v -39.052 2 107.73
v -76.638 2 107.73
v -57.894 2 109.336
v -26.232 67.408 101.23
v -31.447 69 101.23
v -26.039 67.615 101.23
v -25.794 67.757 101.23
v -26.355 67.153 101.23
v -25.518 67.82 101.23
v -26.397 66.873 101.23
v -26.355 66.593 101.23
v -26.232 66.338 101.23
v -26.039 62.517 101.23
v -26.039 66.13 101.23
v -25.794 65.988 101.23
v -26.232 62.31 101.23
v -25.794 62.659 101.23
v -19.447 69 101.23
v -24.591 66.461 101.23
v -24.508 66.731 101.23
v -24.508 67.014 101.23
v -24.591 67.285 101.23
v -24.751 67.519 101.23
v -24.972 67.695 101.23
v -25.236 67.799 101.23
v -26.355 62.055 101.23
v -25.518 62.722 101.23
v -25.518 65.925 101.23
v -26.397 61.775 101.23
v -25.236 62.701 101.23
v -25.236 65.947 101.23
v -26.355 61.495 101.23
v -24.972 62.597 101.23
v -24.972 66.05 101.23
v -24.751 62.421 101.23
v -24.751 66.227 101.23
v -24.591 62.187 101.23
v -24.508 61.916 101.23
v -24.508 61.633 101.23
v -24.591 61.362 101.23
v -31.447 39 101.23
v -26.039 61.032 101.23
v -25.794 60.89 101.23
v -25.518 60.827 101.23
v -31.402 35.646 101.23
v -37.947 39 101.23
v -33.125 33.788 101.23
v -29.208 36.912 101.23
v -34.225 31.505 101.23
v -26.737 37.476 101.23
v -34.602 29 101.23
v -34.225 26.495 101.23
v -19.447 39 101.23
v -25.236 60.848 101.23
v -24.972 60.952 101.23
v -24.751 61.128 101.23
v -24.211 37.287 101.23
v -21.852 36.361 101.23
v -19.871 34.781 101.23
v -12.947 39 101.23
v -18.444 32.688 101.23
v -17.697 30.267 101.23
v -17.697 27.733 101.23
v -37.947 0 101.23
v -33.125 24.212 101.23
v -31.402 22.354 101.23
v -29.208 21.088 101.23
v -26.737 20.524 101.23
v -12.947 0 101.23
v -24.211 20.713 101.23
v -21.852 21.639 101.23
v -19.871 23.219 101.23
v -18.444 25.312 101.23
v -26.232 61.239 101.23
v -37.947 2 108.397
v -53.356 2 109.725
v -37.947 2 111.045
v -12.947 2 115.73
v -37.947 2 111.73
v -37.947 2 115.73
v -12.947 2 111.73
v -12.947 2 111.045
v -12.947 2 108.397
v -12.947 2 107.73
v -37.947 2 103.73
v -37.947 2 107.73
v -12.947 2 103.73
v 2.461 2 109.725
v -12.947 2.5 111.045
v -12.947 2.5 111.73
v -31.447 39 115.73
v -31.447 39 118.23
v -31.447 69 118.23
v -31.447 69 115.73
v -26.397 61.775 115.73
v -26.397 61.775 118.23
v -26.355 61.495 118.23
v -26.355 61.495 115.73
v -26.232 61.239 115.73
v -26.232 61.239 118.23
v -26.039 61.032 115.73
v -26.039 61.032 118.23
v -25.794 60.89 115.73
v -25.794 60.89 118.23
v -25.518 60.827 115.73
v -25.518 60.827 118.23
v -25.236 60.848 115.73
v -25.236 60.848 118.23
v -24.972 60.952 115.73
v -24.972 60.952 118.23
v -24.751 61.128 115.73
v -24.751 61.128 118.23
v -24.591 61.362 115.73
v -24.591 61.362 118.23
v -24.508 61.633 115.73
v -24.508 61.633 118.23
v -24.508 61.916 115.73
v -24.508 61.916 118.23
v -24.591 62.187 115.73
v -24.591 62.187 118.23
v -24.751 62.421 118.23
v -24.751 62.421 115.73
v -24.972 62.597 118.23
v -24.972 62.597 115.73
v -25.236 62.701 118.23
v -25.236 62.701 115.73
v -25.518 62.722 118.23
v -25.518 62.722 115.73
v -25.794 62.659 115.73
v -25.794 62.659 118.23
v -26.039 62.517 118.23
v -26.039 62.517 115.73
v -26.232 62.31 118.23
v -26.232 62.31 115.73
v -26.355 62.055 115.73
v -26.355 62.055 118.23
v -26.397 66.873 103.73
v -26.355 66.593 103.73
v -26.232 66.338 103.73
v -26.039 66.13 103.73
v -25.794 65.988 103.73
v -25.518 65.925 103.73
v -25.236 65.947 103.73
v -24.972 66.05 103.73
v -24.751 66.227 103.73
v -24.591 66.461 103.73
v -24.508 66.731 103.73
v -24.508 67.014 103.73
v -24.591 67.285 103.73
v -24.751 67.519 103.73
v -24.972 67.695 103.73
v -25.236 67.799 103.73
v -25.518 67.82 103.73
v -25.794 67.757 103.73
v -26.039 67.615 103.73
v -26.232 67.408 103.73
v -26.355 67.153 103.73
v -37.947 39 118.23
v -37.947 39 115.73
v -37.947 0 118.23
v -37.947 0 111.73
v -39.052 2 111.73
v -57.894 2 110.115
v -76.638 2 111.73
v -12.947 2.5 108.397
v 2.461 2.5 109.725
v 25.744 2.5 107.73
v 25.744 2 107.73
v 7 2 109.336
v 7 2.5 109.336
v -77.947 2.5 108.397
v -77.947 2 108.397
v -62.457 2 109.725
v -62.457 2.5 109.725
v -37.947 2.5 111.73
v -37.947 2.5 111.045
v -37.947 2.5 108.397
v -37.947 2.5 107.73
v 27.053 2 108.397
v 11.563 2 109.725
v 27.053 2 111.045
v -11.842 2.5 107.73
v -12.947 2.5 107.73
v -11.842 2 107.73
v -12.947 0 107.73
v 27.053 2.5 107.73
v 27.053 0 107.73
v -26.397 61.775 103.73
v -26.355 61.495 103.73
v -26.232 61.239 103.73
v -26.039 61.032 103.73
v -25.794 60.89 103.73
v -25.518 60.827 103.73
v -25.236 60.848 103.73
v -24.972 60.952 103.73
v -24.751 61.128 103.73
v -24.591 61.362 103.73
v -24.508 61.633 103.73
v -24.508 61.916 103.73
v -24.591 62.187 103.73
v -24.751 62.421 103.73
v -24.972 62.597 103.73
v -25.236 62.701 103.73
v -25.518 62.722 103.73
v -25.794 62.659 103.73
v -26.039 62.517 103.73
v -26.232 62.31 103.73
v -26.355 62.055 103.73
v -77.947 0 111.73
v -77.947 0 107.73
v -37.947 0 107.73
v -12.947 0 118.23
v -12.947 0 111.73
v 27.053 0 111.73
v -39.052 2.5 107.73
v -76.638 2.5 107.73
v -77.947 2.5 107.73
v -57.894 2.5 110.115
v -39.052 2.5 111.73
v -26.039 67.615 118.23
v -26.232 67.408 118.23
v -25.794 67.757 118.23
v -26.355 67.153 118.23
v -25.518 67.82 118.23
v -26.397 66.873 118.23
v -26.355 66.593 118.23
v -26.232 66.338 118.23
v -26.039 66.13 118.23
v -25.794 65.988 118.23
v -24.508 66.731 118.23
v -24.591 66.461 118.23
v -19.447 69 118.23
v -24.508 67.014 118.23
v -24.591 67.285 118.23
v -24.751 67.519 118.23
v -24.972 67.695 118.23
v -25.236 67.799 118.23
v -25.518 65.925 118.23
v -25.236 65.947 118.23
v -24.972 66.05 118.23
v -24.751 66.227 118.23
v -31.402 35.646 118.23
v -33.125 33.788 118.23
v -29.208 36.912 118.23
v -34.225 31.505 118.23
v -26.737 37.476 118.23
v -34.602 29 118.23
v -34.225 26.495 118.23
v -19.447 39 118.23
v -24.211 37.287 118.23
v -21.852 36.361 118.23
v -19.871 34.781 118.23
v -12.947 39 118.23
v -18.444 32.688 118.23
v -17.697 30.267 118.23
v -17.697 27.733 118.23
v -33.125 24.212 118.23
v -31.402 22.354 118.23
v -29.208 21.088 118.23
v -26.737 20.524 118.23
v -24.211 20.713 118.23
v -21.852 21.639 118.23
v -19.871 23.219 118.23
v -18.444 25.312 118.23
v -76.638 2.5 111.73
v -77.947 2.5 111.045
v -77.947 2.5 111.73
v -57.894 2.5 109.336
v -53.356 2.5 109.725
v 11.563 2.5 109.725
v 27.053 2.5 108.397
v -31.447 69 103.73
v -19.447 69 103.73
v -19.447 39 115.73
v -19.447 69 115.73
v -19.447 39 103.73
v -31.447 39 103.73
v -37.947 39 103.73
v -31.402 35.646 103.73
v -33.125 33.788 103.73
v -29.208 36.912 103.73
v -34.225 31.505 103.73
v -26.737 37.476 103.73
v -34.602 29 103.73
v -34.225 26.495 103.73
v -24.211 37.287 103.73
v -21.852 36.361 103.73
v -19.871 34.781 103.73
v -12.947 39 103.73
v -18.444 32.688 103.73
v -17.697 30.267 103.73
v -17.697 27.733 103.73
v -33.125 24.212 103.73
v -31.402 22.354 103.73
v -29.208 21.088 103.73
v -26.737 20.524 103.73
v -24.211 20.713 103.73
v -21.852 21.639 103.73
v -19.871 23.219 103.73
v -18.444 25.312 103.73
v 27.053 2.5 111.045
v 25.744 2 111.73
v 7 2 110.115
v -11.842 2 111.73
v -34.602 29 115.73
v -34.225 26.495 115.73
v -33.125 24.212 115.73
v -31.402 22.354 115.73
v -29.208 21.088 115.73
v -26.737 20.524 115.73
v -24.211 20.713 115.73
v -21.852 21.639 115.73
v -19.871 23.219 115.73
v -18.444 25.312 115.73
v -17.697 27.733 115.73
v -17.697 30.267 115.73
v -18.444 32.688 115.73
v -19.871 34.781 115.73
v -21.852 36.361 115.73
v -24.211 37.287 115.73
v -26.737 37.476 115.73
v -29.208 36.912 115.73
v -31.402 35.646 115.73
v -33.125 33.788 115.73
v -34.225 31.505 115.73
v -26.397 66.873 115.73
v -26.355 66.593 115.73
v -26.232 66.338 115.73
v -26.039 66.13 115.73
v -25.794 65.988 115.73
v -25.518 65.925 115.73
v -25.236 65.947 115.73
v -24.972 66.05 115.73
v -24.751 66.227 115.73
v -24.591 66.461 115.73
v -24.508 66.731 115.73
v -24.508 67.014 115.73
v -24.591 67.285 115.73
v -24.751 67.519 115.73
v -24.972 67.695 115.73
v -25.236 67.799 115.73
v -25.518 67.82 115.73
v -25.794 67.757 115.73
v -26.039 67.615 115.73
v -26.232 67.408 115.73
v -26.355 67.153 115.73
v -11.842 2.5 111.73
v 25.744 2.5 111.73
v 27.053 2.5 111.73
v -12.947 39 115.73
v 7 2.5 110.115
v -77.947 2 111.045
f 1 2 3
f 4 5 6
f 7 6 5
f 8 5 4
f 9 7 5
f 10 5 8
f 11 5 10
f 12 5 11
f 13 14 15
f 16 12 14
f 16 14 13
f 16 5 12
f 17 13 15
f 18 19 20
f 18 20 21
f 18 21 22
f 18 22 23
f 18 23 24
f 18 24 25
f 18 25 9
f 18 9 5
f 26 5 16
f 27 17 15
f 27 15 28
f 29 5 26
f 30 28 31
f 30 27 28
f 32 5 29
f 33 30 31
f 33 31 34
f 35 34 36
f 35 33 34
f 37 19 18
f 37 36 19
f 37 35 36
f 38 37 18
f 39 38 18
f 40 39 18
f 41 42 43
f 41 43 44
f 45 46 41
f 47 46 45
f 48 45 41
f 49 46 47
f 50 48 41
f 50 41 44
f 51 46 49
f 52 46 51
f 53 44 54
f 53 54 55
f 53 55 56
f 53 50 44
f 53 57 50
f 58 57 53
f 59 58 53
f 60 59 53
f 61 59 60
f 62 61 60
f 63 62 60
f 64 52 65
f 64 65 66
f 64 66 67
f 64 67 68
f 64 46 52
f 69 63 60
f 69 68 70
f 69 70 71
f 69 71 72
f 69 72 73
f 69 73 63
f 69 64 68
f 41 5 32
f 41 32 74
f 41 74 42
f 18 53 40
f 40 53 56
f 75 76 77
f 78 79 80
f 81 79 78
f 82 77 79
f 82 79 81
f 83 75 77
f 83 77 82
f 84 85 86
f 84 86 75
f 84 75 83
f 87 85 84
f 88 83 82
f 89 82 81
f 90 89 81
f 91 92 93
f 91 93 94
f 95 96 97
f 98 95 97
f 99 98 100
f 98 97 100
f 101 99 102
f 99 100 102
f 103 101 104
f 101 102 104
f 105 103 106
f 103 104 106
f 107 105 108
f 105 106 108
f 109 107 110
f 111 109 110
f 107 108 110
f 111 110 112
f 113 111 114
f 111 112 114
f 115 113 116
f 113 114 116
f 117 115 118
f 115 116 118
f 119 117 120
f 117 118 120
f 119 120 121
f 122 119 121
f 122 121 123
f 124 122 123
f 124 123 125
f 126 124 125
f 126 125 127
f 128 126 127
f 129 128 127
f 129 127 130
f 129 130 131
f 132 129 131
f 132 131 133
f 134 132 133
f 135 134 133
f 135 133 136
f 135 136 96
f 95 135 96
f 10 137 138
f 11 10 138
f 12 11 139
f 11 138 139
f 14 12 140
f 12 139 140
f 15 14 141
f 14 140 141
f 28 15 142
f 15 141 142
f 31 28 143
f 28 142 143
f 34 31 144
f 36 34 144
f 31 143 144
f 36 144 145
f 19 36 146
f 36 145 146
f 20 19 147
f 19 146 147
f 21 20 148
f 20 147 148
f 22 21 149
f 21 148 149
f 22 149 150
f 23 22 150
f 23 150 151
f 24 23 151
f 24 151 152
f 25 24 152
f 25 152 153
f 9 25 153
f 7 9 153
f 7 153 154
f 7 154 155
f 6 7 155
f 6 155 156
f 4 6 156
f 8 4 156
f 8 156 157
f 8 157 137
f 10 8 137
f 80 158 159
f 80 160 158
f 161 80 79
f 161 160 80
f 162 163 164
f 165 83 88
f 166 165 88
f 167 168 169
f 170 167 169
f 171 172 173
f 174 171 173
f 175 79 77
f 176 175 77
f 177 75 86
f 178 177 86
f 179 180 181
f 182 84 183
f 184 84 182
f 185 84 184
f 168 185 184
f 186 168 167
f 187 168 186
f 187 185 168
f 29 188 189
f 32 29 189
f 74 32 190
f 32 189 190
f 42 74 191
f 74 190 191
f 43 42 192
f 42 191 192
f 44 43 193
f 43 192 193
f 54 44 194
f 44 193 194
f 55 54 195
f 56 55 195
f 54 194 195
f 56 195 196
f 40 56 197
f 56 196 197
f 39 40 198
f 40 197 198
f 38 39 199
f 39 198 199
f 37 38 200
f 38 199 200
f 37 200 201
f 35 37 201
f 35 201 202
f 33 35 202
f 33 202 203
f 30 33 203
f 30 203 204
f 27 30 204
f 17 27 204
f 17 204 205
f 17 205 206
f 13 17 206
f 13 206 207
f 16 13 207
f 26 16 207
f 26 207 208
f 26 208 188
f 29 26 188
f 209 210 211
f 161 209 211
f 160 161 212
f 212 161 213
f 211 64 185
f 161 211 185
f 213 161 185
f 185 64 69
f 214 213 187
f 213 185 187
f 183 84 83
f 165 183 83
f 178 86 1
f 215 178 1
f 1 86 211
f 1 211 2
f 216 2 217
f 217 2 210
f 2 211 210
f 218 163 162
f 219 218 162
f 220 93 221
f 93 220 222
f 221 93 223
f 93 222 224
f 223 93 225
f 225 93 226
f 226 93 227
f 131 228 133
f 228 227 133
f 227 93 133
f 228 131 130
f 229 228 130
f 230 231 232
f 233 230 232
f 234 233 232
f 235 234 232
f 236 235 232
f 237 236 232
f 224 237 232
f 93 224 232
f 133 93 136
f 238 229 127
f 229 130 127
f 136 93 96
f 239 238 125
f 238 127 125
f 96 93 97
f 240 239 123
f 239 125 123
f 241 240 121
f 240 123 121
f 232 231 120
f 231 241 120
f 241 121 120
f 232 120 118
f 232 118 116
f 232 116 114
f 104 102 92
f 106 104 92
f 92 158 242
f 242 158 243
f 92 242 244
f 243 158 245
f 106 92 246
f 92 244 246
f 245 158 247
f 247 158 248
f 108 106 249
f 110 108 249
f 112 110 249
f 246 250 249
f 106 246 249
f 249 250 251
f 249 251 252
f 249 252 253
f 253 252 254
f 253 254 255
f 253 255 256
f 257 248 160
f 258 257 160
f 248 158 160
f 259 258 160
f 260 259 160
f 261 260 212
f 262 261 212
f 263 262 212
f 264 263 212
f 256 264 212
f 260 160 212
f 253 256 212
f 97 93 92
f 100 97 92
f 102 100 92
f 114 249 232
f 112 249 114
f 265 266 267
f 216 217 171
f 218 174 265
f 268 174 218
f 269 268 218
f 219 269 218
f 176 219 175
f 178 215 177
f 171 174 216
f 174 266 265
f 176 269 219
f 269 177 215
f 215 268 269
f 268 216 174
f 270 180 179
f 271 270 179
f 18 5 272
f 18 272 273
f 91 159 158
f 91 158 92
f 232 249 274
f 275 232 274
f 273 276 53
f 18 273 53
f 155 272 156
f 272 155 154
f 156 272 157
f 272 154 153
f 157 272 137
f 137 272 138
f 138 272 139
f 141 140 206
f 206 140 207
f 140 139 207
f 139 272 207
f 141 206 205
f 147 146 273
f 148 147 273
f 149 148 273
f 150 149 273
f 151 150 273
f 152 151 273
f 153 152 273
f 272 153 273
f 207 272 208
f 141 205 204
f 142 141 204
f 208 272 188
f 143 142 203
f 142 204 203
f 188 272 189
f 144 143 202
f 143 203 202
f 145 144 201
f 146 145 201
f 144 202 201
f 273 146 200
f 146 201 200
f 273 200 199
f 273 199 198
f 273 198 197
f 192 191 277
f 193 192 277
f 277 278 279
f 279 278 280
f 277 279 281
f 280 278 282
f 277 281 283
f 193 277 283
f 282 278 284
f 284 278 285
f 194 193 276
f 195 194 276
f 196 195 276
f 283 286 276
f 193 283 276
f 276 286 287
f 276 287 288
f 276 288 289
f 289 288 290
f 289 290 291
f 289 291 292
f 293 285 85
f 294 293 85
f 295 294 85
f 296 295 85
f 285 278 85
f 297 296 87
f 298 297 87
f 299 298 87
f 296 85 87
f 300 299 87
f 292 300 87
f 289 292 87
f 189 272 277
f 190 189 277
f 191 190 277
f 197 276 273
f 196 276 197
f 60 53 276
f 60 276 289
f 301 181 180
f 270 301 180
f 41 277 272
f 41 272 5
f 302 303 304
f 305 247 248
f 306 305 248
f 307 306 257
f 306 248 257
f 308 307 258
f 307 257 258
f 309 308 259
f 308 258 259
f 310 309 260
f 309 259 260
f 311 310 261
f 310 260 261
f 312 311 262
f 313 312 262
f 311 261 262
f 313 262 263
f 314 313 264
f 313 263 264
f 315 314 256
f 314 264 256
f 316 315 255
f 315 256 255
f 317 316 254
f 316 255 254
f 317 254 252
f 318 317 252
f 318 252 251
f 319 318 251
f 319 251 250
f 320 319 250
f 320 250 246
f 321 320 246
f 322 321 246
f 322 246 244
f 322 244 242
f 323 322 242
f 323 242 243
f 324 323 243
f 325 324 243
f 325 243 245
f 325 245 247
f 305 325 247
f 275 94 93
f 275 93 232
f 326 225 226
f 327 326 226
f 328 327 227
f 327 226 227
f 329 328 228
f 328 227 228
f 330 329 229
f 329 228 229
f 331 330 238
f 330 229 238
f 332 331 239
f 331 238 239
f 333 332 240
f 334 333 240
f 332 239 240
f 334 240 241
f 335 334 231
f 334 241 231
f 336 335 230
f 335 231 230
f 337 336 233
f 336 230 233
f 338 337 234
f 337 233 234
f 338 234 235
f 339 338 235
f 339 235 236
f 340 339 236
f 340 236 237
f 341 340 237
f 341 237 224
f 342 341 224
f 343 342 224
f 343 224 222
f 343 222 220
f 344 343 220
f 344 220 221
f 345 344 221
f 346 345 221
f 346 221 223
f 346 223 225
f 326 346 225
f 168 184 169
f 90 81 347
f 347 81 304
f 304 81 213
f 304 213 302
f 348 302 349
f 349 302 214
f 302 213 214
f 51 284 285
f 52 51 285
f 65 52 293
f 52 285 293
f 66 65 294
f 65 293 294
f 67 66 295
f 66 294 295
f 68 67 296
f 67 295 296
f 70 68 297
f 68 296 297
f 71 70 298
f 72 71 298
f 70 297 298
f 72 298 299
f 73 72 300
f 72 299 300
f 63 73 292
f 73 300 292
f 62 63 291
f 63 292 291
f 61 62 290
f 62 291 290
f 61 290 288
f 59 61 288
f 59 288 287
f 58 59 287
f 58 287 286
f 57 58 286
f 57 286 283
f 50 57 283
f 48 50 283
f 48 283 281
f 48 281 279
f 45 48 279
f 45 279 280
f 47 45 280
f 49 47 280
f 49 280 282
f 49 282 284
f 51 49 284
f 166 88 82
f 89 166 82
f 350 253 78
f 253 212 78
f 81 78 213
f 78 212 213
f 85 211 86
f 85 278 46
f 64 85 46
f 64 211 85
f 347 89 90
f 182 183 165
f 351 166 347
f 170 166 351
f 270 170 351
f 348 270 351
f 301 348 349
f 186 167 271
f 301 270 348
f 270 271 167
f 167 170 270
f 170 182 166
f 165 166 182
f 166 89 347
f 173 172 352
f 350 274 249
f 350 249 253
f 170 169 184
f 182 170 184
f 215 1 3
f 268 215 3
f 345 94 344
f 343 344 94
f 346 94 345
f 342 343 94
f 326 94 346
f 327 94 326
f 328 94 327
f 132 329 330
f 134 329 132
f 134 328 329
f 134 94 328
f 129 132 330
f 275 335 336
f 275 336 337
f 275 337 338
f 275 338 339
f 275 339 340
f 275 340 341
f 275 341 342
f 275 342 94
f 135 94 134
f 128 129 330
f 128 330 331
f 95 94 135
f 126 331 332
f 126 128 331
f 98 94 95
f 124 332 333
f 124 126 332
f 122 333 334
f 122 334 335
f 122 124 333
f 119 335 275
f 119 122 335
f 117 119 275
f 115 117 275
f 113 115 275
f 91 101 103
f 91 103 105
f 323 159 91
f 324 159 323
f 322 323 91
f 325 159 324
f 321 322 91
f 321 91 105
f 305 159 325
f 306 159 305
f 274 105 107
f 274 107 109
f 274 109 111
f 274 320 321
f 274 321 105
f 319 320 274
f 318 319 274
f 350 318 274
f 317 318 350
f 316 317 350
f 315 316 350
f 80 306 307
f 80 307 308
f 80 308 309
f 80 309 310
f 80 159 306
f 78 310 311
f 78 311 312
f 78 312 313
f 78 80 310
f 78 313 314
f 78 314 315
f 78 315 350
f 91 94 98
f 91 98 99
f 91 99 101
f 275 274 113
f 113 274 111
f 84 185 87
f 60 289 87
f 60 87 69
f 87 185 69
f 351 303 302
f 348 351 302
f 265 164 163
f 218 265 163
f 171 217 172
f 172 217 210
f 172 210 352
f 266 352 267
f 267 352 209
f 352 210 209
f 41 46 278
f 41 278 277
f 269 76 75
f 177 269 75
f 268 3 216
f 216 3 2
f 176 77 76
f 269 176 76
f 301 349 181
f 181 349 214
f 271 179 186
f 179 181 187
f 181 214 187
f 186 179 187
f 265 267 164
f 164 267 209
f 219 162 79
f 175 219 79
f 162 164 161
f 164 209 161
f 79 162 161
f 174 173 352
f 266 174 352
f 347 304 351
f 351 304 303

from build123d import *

# Parameters (mm, degrees)
SKETCH1_W           = 40
SKETCH1_H           = 4
SKETCH1_W_2         = 25
SKETCH1_H_2         = 17
BOSS_EXTRUDE1_DEPTH = 2
BOSS_EXTRUDE2_DEPTH = 0.5
SKETCH3_W           = 25
SKETCH3_H           = 2.5
BOSS_EXTRUDE3_DEPTH = 37
SKETCH4_R           = 8.5
CUT_EXTRUDE1_DEPTH  = 37
SKETCH6_W           = 12
SKETCH6_H           = 2.5
BOSS_EXTRUDE4_DEPTH = 30
SKETCH8_R           = 0.95
CUT_EXTRUDE2_DEPTH  = 30


with BuildPart() as part:
    # Sketch1 → Boss-Extrude1 (new body)
    with BuildSketch(Plane(origin=(0, 0, 0), x_dir=(1, 0, 0), z_dir=(0, 1, 0))):
        with Locations((-57.947101463, -109.729781289)):
            Rectangle(SKETCH1_W, SKETCH1_H)
        with Locations((-25.447101463, -109.729781289)):
            Rectangle(SKETCH1_W_2, SKETCH1_H_2)
        with Locations((7.052898537, -109.729781289)):
            Rectangle(SKETCH1_W, SKETCH1_H)
    extrude(amount=BOSS_EXTRUDE1_DEPTH)

    # Sketch2 → Boss-Extrude2 (add)
    with BuildSketch(Plane(origin=(0, 2, 0), x_dir=(1, 0, 0), z_dir=(0, 1, 0))):
        Polygon((-77.947101463, -108.397425258), (-62.457280687, -109.724520363), (-57.894492201, -109.335653269), (-76.638189664, -107.729781289), (-77.947101463, -107.729781289), align=None)
        Polygon((-76.638189664, -111.729781289), (-57.894492201, -110.115438654), (-62.457280687, -109.724520363), (-77.947101463, -111.044652036), (-77.947101463, -111.729781289), align=None)
        Polygon((-57.894492201, -110.115438654), (-39.051925459, -111.729781289), (-37.947101463, -111.729781289), (-37.947101463, -111.044652036), (-53.355645232, -109.724520363), align=None)
        Polygon((-62.457280687, -109.724520363), (-57.894492201, -110.115438654), (-53.355645232, -109.724520363), (-57.894492201, -109.335653269), align=None)
        Polygon((-57.894492201, -109.335653269), (-53.355645232, -109.724520363), (-37.947101463, -108.397425258), (-37.947101463, -107.729781289), (-39.051925459, -107.729781289), align=None)
        Polygon((-11.842277467, -111.729781289), (7.000289276, -110.115438654), (2.461442306, -109.724520363), (-12.947101463, -111.044652036), (-12.947101463, -111.729781289), align=None)
        Polygon((2.461442306, -109.724520363), (7.000289276, -109.335653269), (-11.842277467, -107.729781289), (-12.947101463, -107.729781289), (-12.947101463, -108.397425258), align=None)
        Polygon((7.000289276, -110.115438654), (11.563077761, -109.724520363), (7.000289276, -109.335653269), (2.461442306, -109.724520363), align=None)
        Polygon((27.052898537, -111.729781289), (27.052898537, -111.044652036), (11.563077761, -109.724520363), (7.000289276, -110.115438654), (25.743986738, -111.729781289), align=None)
        Polygon((7.000289276, -109.335653269), (11.563077761, -109.724520363), (27.052898537, -108.397425258), (27.052898537, -107.729781289), (25.743986738, -107.729781289), align=None)
    extrude(amount=BOSS_EXTRUDE2_DEPTH)

    # Sketch3 → Boss-Extrude3 (add)
    with BuildSketch(Plane(origin=(0, 2, 0), x_dir=(1, 0, 0), z_dir=(0, 1, 0))):
        with Locations((-25.447101463, -116.979781289)):
            Rectangle(SKETCH3_W, SKETCH3_H)
        with Locations((-25.447101463, -102.479781289)):
            Rectangle(SKETCH3_W, SKETCH3_H)
    extrude(amount=BOSS_EXTRUDE3_DEPTH)

    # Sketch4 → Cut-Extrude1 (cut)
    with BuildSketch(Plane.XY.offset(118.229781289)):
        with Locations(Location((-26.102234561, 29, 0), (0, 0, 180))):
            Circle(SKETCH4_R)
    extrude(amount=-CUT_EXTRUDE1_DEPTH, mode=Mode.SUBTRACT)

    # Sketch6 → Boss-Extrude4 (add)
    with BuildSketch(Plane(origin=(0, 39, 0), x_dir=(1, 0, 0), z_dir=(0, 1, 0))):
        with Locations((-25.447101463, -116.979781289)):
            Rectangle(SKETCH6_W, SKETCH6_H)
        with Locations((-25.447101463, -102.479781289)):
            Rectangle(SKETCH6_W, SKETCH6_H)
    extrude(amount=BOSS_EXTRUDE4_DEPTH)

    # Sketch8 → Cut-Extrude2 (cut)
    with BuildSketch(Plane.XY.offset(118.229781289)):
        with Locations(Location((-25.447101463, 66.872747416, 0), (0, 0, 180))):
            Circle(SKETCH8_R)
        with Locations(Location((-25.447101463, 61.774545812, 0), (0, 0, 180))):
            Circle(SKETCH8_R)
    extrude(amount=-CUT_EXTRUDE2_DEPTH, mode=Mode.SUBTRACT)


solid = part.part
